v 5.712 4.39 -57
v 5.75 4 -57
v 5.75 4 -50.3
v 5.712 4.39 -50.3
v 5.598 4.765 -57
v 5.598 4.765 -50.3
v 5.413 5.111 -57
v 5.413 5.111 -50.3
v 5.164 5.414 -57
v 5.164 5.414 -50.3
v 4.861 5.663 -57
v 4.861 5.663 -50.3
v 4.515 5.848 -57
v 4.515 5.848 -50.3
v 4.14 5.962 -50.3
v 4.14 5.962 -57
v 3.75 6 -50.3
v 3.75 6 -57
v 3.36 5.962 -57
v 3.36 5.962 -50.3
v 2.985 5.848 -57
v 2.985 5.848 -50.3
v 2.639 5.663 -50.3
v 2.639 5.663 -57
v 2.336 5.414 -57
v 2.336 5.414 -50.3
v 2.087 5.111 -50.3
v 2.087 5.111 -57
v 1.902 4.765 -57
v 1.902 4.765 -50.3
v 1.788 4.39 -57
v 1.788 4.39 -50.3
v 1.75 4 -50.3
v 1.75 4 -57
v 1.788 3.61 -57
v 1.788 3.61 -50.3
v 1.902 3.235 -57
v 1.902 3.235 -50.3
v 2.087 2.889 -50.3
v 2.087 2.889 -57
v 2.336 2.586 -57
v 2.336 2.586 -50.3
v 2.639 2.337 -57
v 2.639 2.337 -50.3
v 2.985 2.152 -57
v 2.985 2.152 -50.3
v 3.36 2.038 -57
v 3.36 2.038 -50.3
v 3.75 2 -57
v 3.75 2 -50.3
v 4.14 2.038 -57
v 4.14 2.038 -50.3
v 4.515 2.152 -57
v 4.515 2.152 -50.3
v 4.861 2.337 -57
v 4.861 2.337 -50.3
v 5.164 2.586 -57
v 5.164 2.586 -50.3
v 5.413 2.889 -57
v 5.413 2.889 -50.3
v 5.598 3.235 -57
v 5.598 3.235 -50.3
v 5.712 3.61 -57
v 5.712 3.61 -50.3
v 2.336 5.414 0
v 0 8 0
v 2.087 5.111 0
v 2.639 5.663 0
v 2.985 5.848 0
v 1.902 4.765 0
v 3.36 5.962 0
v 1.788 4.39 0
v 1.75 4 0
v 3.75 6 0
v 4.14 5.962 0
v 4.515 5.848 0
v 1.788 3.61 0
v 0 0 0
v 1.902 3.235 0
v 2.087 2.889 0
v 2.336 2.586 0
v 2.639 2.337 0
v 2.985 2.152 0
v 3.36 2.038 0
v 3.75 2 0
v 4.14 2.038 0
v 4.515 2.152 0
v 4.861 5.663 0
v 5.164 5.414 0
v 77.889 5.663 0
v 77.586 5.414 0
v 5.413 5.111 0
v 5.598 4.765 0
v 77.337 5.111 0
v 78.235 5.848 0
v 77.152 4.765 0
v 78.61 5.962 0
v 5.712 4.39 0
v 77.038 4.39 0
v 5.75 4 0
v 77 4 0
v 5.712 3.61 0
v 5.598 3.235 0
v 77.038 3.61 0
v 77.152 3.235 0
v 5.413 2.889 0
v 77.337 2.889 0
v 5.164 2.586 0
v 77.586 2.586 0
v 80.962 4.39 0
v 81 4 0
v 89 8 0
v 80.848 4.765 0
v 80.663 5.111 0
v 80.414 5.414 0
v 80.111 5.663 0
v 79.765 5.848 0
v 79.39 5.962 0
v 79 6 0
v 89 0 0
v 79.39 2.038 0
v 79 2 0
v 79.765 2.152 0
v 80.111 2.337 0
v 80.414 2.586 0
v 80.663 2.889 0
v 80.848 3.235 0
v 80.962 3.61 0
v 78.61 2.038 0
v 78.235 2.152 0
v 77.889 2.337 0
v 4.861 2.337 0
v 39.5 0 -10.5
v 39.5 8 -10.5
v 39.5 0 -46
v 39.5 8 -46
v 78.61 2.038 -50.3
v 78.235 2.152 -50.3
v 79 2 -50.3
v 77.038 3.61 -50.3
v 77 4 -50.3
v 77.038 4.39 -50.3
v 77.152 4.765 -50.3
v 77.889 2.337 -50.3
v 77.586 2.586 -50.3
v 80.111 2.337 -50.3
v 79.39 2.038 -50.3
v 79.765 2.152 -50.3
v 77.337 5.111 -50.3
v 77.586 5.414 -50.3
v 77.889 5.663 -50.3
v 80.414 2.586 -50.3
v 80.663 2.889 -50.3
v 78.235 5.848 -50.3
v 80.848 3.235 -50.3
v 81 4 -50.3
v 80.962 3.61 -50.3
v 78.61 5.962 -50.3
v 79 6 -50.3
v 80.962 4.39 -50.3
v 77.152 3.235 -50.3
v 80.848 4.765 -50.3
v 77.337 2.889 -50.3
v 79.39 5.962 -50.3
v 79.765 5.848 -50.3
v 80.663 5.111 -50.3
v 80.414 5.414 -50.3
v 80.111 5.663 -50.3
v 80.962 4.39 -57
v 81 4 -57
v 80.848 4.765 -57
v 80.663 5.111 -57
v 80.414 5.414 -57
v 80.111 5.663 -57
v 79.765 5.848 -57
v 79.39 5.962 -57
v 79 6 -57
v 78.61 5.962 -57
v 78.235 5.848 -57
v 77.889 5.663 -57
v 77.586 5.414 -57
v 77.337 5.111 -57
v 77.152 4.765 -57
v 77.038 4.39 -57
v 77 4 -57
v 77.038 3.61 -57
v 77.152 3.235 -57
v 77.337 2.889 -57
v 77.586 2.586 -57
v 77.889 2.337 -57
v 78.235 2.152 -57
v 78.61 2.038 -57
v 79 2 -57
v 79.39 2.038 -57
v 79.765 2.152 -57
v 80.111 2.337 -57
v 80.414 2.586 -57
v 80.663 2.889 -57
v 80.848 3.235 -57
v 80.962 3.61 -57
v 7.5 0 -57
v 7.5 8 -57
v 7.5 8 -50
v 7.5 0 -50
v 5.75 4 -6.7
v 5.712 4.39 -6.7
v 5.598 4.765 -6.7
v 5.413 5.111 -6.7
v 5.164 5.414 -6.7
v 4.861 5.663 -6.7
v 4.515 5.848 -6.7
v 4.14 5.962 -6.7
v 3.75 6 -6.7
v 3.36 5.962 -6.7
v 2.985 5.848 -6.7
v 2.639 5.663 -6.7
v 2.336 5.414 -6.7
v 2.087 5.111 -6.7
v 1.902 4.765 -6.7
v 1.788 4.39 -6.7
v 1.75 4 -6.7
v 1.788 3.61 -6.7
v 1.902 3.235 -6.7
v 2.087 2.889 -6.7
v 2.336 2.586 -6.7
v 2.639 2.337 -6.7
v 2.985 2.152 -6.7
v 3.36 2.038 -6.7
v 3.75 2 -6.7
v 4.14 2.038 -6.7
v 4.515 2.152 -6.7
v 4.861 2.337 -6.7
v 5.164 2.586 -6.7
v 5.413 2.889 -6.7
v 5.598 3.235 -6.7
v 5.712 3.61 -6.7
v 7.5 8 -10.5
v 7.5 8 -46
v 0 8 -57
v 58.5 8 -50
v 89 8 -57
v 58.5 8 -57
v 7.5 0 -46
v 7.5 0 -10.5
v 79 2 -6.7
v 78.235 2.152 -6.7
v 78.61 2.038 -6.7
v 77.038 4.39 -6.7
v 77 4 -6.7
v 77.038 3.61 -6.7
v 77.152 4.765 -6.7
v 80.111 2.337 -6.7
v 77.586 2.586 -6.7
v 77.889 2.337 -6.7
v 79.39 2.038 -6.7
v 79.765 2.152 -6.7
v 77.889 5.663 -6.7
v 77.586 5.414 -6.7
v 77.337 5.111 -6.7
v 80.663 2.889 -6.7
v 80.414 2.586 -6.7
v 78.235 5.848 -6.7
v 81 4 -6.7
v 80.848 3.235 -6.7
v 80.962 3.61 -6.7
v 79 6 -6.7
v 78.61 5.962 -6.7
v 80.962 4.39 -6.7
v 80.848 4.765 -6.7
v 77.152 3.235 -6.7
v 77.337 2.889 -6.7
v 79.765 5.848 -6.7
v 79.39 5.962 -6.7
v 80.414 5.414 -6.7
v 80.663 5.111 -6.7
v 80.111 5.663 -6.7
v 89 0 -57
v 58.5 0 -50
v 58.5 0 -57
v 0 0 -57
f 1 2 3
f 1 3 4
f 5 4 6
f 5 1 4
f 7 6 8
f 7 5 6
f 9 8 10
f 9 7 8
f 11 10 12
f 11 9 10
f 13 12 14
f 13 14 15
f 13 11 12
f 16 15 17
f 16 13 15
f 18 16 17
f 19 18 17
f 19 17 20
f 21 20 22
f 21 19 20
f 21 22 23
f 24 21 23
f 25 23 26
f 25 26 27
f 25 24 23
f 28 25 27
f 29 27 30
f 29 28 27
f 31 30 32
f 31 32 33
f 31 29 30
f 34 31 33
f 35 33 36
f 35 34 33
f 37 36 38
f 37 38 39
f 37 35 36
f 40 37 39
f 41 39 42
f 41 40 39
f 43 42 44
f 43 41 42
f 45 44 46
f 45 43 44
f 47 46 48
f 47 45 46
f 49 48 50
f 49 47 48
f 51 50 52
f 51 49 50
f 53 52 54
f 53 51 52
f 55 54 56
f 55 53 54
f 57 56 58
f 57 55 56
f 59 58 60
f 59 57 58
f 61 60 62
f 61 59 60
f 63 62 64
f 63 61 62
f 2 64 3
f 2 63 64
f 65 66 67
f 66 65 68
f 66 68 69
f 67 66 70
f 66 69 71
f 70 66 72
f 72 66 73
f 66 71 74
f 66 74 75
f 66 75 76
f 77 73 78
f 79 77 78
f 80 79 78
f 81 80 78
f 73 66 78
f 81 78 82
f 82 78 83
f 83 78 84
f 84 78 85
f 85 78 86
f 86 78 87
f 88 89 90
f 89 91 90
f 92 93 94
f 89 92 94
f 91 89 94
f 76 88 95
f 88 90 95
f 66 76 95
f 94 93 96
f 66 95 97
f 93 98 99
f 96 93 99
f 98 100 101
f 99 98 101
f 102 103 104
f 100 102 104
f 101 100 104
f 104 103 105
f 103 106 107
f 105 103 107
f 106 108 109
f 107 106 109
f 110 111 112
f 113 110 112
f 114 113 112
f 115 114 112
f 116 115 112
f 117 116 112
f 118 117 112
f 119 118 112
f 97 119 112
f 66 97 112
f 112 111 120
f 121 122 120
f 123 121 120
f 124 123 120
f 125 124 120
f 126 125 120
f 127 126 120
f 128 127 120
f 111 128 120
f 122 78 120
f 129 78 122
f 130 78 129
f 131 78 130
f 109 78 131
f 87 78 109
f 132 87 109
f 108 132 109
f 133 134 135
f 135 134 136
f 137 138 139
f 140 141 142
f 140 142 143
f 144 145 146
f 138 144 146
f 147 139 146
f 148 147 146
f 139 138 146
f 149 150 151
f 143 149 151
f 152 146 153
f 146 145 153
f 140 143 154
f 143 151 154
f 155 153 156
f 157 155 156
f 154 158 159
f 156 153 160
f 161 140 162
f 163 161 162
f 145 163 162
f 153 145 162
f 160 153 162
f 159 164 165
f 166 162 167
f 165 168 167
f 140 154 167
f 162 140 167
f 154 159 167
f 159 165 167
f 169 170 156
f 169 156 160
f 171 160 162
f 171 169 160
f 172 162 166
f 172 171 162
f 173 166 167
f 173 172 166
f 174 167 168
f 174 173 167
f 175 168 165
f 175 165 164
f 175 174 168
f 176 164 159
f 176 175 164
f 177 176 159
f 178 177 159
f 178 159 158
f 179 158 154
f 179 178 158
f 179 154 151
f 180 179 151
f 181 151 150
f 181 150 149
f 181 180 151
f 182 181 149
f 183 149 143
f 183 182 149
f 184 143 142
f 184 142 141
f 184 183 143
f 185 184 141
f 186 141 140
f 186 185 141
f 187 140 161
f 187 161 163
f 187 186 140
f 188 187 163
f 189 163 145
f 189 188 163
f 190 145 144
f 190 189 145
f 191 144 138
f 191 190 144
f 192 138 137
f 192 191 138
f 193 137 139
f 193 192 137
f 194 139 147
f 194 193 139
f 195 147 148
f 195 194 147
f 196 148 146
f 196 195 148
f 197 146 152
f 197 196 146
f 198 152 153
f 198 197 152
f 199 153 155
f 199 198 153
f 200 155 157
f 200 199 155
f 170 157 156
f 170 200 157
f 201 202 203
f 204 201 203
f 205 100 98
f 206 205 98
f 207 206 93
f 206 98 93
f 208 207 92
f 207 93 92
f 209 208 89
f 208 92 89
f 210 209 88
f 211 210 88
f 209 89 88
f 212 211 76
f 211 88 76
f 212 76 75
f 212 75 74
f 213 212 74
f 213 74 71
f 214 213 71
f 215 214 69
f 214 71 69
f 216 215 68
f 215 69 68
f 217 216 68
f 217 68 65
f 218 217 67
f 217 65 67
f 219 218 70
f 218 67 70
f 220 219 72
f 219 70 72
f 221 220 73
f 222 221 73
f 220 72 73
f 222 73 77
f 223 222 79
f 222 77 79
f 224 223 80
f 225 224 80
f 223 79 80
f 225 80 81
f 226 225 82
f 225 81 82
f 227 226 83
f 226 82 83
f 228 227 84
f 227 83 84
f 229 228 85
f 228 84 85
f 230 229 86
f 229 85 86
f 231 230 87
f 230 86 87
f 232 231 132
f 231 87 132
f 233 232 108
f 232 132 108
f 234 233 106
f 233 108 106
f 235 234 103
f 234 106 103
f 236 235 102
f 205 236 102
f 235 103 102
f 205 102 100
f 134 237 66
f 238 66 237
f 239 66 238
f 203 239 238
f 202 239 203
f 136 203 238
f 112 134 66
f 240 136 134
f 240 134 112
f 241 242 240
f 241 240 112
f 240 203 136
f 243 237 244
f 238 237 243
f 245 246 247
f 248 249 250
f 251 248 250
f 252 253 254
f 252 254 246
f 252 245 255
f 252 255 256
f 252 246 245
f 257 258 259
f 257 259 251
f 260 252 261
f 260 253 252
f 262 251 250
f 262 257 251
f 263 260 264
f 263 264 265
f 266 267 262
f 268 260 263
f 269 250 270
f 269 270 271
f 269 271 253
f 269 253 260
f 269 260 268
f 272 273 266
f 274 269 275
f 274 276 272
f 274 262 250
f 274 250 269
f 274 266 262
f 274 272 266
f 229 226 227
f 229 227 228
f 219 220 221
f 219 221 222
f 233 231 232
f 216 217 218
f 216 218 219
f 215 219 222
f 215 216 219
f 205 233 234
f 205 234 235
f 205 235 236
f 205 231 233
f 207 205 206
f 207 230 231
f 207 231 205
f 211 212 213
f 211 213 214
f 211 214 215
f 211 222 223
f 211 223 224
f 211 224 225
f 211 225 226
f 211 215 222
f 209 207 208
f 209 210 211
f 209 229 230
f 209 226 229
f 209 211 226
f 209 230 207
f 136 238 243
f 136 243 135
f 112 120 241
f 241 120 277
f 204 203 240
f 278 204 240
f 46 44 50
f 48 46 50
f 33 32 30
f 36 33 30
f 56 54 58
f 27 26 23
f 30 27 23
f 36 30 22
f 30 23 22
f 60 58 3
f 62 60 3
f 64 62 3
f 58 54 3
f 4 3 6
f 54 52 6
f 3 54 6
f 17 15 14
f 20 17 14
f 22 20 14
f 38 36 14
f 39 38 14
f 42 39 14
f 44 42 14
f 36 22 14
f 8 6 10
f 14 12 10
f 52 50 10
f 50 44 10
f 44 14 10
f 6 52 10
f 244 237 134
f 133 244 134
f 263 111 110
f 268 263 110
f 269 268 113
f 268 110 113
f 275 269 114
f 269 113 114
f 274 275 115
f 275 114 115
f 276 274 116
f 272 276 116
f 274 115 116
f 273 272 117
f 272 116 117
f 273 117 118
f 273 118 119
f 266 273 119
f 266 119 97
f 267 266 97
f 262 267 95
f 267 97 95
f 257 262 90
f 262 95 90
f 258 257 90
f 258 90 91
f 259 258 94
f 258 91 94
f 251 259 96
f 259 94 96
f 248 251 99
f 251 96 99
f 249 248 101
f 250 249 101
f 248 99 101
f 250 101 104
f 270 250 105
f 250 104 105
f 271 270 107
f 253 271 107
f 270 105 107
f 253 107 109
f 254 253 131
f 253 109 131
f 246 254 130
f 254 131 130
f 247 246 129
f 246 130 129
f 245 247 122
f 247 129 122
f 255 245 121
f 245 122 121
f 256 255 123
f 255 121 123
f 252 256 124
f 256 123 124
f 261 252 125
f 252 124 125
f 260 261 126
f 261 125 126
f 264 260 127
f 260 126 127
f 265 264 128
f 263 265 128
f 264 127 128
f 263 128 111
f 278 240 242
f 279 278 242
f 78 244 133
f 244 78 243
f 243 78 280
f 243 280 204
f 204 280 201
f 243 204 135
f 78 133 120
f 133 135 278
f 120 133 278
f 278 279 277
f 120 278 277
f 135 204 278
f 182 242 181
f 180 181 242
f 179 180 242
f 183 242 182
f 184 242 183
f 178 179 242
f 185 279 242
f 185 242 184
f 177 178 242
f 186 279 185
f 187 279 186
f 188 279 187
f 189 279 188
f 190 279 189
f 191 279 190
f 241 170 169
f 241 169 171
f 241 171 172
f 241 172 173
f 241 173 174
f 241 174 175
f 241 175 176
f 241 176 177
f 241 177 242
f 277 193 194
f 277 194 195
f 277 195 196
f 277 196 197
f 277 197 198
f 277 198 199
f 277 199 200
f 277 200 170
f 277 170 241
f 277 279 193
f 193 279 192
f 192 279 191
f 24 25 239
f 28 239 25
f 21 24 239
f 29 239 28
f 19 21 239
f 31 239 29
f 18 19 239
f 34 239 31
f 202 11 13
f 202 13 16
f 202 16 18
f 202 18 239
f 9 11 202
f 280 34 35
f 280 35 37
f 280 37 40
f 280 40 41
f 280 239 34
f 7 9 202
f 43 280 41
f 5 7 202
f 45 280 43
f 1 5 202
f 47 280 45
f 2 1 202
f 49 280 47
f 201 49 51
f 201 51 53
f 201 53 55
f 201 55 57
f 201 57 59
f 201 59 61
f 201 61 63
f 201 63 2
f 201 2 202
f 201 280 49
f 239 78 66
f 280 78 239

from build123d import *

# Parameters (mm, degrees)
SKETCH1_W           = 89
SKETCH1_H           = 57
BOSS_EXTRUDE1_DEPTH = 8
SKETCH2_W           = 32
SKETCH2_H           = 35.5
SKETCH2_H_2         = 6
SKETCH2_W_2         = 19
SKETCH2_H_3         = 1
CUT_EXTRUDE2_DEPTH  = 106.990565618
SKETCH3_R           = 2
CUT_EXTRUDE3_DEPTH  = 6.7


with BuildPart() as part:
    # Sketch1 → Boss-Extrude1 (new body)
    with BuildSketch(Plane(origin=(0, 0, 0), x_dir=(1, 0, 0), z_dir=(0, 1, 0))):
        with Locations((44.5, 28.5)):
            Rectangle(SKETCH1_W, SKETCH1_H)
    extrude(amount=BOSS_EXTRUDE1_DEPTH)

    # Sketch2 → Cut-Extrude2 (cut, through all)
    with BuildSketch(Plane(origin=(0, 8, 0), x_dir=(1, 0, 0), z_dir=(0, 1, 0))):
        with Locations((23.5, 28.25)):
            Rectangle(SKETCH2_W, SKETCH2_H)
        with Locations((23.5, 53)):
            Rectangle(SKETCH2_W, SKETCH2_H_2)
        with Locations((49, 53)):
            Rectangle(SKETCH2_W_2, SKETCH2_H_2)
        with Locations((49, 56.5)):
            Rectangle(SKETCH2_W_2, SKETCH2_H_3)
        with Locations((23.5, 56.5)):
            Rectangle(SKETCH2_W, SKETCH2_H_3)
    extrude(amount=-CUT_EXTRUDE2_DEPTH, mode=Mode.SUBTRACT)

    # Sketch3 → Cut-Extrude3 (cut)
    with BuildSketch(Plane.XY):
        with Locations((3.75, 4)):
            Circle(SKETCH3_R)
        with Locations((79, 4)):
            Circle(SKETCH3_R)
    cut_extrude3 = extrude(amount=-CUT_EXTRUDE3_DEPTH, mode=Mode.SUBTRACT)

    # Mirror1: Cut-Extrude3 across plane
    add(cut_extrude3.mirror(Plane.XY.offset(-28.5)), mode=Mode.SUBTRACT)


solid = part.part
